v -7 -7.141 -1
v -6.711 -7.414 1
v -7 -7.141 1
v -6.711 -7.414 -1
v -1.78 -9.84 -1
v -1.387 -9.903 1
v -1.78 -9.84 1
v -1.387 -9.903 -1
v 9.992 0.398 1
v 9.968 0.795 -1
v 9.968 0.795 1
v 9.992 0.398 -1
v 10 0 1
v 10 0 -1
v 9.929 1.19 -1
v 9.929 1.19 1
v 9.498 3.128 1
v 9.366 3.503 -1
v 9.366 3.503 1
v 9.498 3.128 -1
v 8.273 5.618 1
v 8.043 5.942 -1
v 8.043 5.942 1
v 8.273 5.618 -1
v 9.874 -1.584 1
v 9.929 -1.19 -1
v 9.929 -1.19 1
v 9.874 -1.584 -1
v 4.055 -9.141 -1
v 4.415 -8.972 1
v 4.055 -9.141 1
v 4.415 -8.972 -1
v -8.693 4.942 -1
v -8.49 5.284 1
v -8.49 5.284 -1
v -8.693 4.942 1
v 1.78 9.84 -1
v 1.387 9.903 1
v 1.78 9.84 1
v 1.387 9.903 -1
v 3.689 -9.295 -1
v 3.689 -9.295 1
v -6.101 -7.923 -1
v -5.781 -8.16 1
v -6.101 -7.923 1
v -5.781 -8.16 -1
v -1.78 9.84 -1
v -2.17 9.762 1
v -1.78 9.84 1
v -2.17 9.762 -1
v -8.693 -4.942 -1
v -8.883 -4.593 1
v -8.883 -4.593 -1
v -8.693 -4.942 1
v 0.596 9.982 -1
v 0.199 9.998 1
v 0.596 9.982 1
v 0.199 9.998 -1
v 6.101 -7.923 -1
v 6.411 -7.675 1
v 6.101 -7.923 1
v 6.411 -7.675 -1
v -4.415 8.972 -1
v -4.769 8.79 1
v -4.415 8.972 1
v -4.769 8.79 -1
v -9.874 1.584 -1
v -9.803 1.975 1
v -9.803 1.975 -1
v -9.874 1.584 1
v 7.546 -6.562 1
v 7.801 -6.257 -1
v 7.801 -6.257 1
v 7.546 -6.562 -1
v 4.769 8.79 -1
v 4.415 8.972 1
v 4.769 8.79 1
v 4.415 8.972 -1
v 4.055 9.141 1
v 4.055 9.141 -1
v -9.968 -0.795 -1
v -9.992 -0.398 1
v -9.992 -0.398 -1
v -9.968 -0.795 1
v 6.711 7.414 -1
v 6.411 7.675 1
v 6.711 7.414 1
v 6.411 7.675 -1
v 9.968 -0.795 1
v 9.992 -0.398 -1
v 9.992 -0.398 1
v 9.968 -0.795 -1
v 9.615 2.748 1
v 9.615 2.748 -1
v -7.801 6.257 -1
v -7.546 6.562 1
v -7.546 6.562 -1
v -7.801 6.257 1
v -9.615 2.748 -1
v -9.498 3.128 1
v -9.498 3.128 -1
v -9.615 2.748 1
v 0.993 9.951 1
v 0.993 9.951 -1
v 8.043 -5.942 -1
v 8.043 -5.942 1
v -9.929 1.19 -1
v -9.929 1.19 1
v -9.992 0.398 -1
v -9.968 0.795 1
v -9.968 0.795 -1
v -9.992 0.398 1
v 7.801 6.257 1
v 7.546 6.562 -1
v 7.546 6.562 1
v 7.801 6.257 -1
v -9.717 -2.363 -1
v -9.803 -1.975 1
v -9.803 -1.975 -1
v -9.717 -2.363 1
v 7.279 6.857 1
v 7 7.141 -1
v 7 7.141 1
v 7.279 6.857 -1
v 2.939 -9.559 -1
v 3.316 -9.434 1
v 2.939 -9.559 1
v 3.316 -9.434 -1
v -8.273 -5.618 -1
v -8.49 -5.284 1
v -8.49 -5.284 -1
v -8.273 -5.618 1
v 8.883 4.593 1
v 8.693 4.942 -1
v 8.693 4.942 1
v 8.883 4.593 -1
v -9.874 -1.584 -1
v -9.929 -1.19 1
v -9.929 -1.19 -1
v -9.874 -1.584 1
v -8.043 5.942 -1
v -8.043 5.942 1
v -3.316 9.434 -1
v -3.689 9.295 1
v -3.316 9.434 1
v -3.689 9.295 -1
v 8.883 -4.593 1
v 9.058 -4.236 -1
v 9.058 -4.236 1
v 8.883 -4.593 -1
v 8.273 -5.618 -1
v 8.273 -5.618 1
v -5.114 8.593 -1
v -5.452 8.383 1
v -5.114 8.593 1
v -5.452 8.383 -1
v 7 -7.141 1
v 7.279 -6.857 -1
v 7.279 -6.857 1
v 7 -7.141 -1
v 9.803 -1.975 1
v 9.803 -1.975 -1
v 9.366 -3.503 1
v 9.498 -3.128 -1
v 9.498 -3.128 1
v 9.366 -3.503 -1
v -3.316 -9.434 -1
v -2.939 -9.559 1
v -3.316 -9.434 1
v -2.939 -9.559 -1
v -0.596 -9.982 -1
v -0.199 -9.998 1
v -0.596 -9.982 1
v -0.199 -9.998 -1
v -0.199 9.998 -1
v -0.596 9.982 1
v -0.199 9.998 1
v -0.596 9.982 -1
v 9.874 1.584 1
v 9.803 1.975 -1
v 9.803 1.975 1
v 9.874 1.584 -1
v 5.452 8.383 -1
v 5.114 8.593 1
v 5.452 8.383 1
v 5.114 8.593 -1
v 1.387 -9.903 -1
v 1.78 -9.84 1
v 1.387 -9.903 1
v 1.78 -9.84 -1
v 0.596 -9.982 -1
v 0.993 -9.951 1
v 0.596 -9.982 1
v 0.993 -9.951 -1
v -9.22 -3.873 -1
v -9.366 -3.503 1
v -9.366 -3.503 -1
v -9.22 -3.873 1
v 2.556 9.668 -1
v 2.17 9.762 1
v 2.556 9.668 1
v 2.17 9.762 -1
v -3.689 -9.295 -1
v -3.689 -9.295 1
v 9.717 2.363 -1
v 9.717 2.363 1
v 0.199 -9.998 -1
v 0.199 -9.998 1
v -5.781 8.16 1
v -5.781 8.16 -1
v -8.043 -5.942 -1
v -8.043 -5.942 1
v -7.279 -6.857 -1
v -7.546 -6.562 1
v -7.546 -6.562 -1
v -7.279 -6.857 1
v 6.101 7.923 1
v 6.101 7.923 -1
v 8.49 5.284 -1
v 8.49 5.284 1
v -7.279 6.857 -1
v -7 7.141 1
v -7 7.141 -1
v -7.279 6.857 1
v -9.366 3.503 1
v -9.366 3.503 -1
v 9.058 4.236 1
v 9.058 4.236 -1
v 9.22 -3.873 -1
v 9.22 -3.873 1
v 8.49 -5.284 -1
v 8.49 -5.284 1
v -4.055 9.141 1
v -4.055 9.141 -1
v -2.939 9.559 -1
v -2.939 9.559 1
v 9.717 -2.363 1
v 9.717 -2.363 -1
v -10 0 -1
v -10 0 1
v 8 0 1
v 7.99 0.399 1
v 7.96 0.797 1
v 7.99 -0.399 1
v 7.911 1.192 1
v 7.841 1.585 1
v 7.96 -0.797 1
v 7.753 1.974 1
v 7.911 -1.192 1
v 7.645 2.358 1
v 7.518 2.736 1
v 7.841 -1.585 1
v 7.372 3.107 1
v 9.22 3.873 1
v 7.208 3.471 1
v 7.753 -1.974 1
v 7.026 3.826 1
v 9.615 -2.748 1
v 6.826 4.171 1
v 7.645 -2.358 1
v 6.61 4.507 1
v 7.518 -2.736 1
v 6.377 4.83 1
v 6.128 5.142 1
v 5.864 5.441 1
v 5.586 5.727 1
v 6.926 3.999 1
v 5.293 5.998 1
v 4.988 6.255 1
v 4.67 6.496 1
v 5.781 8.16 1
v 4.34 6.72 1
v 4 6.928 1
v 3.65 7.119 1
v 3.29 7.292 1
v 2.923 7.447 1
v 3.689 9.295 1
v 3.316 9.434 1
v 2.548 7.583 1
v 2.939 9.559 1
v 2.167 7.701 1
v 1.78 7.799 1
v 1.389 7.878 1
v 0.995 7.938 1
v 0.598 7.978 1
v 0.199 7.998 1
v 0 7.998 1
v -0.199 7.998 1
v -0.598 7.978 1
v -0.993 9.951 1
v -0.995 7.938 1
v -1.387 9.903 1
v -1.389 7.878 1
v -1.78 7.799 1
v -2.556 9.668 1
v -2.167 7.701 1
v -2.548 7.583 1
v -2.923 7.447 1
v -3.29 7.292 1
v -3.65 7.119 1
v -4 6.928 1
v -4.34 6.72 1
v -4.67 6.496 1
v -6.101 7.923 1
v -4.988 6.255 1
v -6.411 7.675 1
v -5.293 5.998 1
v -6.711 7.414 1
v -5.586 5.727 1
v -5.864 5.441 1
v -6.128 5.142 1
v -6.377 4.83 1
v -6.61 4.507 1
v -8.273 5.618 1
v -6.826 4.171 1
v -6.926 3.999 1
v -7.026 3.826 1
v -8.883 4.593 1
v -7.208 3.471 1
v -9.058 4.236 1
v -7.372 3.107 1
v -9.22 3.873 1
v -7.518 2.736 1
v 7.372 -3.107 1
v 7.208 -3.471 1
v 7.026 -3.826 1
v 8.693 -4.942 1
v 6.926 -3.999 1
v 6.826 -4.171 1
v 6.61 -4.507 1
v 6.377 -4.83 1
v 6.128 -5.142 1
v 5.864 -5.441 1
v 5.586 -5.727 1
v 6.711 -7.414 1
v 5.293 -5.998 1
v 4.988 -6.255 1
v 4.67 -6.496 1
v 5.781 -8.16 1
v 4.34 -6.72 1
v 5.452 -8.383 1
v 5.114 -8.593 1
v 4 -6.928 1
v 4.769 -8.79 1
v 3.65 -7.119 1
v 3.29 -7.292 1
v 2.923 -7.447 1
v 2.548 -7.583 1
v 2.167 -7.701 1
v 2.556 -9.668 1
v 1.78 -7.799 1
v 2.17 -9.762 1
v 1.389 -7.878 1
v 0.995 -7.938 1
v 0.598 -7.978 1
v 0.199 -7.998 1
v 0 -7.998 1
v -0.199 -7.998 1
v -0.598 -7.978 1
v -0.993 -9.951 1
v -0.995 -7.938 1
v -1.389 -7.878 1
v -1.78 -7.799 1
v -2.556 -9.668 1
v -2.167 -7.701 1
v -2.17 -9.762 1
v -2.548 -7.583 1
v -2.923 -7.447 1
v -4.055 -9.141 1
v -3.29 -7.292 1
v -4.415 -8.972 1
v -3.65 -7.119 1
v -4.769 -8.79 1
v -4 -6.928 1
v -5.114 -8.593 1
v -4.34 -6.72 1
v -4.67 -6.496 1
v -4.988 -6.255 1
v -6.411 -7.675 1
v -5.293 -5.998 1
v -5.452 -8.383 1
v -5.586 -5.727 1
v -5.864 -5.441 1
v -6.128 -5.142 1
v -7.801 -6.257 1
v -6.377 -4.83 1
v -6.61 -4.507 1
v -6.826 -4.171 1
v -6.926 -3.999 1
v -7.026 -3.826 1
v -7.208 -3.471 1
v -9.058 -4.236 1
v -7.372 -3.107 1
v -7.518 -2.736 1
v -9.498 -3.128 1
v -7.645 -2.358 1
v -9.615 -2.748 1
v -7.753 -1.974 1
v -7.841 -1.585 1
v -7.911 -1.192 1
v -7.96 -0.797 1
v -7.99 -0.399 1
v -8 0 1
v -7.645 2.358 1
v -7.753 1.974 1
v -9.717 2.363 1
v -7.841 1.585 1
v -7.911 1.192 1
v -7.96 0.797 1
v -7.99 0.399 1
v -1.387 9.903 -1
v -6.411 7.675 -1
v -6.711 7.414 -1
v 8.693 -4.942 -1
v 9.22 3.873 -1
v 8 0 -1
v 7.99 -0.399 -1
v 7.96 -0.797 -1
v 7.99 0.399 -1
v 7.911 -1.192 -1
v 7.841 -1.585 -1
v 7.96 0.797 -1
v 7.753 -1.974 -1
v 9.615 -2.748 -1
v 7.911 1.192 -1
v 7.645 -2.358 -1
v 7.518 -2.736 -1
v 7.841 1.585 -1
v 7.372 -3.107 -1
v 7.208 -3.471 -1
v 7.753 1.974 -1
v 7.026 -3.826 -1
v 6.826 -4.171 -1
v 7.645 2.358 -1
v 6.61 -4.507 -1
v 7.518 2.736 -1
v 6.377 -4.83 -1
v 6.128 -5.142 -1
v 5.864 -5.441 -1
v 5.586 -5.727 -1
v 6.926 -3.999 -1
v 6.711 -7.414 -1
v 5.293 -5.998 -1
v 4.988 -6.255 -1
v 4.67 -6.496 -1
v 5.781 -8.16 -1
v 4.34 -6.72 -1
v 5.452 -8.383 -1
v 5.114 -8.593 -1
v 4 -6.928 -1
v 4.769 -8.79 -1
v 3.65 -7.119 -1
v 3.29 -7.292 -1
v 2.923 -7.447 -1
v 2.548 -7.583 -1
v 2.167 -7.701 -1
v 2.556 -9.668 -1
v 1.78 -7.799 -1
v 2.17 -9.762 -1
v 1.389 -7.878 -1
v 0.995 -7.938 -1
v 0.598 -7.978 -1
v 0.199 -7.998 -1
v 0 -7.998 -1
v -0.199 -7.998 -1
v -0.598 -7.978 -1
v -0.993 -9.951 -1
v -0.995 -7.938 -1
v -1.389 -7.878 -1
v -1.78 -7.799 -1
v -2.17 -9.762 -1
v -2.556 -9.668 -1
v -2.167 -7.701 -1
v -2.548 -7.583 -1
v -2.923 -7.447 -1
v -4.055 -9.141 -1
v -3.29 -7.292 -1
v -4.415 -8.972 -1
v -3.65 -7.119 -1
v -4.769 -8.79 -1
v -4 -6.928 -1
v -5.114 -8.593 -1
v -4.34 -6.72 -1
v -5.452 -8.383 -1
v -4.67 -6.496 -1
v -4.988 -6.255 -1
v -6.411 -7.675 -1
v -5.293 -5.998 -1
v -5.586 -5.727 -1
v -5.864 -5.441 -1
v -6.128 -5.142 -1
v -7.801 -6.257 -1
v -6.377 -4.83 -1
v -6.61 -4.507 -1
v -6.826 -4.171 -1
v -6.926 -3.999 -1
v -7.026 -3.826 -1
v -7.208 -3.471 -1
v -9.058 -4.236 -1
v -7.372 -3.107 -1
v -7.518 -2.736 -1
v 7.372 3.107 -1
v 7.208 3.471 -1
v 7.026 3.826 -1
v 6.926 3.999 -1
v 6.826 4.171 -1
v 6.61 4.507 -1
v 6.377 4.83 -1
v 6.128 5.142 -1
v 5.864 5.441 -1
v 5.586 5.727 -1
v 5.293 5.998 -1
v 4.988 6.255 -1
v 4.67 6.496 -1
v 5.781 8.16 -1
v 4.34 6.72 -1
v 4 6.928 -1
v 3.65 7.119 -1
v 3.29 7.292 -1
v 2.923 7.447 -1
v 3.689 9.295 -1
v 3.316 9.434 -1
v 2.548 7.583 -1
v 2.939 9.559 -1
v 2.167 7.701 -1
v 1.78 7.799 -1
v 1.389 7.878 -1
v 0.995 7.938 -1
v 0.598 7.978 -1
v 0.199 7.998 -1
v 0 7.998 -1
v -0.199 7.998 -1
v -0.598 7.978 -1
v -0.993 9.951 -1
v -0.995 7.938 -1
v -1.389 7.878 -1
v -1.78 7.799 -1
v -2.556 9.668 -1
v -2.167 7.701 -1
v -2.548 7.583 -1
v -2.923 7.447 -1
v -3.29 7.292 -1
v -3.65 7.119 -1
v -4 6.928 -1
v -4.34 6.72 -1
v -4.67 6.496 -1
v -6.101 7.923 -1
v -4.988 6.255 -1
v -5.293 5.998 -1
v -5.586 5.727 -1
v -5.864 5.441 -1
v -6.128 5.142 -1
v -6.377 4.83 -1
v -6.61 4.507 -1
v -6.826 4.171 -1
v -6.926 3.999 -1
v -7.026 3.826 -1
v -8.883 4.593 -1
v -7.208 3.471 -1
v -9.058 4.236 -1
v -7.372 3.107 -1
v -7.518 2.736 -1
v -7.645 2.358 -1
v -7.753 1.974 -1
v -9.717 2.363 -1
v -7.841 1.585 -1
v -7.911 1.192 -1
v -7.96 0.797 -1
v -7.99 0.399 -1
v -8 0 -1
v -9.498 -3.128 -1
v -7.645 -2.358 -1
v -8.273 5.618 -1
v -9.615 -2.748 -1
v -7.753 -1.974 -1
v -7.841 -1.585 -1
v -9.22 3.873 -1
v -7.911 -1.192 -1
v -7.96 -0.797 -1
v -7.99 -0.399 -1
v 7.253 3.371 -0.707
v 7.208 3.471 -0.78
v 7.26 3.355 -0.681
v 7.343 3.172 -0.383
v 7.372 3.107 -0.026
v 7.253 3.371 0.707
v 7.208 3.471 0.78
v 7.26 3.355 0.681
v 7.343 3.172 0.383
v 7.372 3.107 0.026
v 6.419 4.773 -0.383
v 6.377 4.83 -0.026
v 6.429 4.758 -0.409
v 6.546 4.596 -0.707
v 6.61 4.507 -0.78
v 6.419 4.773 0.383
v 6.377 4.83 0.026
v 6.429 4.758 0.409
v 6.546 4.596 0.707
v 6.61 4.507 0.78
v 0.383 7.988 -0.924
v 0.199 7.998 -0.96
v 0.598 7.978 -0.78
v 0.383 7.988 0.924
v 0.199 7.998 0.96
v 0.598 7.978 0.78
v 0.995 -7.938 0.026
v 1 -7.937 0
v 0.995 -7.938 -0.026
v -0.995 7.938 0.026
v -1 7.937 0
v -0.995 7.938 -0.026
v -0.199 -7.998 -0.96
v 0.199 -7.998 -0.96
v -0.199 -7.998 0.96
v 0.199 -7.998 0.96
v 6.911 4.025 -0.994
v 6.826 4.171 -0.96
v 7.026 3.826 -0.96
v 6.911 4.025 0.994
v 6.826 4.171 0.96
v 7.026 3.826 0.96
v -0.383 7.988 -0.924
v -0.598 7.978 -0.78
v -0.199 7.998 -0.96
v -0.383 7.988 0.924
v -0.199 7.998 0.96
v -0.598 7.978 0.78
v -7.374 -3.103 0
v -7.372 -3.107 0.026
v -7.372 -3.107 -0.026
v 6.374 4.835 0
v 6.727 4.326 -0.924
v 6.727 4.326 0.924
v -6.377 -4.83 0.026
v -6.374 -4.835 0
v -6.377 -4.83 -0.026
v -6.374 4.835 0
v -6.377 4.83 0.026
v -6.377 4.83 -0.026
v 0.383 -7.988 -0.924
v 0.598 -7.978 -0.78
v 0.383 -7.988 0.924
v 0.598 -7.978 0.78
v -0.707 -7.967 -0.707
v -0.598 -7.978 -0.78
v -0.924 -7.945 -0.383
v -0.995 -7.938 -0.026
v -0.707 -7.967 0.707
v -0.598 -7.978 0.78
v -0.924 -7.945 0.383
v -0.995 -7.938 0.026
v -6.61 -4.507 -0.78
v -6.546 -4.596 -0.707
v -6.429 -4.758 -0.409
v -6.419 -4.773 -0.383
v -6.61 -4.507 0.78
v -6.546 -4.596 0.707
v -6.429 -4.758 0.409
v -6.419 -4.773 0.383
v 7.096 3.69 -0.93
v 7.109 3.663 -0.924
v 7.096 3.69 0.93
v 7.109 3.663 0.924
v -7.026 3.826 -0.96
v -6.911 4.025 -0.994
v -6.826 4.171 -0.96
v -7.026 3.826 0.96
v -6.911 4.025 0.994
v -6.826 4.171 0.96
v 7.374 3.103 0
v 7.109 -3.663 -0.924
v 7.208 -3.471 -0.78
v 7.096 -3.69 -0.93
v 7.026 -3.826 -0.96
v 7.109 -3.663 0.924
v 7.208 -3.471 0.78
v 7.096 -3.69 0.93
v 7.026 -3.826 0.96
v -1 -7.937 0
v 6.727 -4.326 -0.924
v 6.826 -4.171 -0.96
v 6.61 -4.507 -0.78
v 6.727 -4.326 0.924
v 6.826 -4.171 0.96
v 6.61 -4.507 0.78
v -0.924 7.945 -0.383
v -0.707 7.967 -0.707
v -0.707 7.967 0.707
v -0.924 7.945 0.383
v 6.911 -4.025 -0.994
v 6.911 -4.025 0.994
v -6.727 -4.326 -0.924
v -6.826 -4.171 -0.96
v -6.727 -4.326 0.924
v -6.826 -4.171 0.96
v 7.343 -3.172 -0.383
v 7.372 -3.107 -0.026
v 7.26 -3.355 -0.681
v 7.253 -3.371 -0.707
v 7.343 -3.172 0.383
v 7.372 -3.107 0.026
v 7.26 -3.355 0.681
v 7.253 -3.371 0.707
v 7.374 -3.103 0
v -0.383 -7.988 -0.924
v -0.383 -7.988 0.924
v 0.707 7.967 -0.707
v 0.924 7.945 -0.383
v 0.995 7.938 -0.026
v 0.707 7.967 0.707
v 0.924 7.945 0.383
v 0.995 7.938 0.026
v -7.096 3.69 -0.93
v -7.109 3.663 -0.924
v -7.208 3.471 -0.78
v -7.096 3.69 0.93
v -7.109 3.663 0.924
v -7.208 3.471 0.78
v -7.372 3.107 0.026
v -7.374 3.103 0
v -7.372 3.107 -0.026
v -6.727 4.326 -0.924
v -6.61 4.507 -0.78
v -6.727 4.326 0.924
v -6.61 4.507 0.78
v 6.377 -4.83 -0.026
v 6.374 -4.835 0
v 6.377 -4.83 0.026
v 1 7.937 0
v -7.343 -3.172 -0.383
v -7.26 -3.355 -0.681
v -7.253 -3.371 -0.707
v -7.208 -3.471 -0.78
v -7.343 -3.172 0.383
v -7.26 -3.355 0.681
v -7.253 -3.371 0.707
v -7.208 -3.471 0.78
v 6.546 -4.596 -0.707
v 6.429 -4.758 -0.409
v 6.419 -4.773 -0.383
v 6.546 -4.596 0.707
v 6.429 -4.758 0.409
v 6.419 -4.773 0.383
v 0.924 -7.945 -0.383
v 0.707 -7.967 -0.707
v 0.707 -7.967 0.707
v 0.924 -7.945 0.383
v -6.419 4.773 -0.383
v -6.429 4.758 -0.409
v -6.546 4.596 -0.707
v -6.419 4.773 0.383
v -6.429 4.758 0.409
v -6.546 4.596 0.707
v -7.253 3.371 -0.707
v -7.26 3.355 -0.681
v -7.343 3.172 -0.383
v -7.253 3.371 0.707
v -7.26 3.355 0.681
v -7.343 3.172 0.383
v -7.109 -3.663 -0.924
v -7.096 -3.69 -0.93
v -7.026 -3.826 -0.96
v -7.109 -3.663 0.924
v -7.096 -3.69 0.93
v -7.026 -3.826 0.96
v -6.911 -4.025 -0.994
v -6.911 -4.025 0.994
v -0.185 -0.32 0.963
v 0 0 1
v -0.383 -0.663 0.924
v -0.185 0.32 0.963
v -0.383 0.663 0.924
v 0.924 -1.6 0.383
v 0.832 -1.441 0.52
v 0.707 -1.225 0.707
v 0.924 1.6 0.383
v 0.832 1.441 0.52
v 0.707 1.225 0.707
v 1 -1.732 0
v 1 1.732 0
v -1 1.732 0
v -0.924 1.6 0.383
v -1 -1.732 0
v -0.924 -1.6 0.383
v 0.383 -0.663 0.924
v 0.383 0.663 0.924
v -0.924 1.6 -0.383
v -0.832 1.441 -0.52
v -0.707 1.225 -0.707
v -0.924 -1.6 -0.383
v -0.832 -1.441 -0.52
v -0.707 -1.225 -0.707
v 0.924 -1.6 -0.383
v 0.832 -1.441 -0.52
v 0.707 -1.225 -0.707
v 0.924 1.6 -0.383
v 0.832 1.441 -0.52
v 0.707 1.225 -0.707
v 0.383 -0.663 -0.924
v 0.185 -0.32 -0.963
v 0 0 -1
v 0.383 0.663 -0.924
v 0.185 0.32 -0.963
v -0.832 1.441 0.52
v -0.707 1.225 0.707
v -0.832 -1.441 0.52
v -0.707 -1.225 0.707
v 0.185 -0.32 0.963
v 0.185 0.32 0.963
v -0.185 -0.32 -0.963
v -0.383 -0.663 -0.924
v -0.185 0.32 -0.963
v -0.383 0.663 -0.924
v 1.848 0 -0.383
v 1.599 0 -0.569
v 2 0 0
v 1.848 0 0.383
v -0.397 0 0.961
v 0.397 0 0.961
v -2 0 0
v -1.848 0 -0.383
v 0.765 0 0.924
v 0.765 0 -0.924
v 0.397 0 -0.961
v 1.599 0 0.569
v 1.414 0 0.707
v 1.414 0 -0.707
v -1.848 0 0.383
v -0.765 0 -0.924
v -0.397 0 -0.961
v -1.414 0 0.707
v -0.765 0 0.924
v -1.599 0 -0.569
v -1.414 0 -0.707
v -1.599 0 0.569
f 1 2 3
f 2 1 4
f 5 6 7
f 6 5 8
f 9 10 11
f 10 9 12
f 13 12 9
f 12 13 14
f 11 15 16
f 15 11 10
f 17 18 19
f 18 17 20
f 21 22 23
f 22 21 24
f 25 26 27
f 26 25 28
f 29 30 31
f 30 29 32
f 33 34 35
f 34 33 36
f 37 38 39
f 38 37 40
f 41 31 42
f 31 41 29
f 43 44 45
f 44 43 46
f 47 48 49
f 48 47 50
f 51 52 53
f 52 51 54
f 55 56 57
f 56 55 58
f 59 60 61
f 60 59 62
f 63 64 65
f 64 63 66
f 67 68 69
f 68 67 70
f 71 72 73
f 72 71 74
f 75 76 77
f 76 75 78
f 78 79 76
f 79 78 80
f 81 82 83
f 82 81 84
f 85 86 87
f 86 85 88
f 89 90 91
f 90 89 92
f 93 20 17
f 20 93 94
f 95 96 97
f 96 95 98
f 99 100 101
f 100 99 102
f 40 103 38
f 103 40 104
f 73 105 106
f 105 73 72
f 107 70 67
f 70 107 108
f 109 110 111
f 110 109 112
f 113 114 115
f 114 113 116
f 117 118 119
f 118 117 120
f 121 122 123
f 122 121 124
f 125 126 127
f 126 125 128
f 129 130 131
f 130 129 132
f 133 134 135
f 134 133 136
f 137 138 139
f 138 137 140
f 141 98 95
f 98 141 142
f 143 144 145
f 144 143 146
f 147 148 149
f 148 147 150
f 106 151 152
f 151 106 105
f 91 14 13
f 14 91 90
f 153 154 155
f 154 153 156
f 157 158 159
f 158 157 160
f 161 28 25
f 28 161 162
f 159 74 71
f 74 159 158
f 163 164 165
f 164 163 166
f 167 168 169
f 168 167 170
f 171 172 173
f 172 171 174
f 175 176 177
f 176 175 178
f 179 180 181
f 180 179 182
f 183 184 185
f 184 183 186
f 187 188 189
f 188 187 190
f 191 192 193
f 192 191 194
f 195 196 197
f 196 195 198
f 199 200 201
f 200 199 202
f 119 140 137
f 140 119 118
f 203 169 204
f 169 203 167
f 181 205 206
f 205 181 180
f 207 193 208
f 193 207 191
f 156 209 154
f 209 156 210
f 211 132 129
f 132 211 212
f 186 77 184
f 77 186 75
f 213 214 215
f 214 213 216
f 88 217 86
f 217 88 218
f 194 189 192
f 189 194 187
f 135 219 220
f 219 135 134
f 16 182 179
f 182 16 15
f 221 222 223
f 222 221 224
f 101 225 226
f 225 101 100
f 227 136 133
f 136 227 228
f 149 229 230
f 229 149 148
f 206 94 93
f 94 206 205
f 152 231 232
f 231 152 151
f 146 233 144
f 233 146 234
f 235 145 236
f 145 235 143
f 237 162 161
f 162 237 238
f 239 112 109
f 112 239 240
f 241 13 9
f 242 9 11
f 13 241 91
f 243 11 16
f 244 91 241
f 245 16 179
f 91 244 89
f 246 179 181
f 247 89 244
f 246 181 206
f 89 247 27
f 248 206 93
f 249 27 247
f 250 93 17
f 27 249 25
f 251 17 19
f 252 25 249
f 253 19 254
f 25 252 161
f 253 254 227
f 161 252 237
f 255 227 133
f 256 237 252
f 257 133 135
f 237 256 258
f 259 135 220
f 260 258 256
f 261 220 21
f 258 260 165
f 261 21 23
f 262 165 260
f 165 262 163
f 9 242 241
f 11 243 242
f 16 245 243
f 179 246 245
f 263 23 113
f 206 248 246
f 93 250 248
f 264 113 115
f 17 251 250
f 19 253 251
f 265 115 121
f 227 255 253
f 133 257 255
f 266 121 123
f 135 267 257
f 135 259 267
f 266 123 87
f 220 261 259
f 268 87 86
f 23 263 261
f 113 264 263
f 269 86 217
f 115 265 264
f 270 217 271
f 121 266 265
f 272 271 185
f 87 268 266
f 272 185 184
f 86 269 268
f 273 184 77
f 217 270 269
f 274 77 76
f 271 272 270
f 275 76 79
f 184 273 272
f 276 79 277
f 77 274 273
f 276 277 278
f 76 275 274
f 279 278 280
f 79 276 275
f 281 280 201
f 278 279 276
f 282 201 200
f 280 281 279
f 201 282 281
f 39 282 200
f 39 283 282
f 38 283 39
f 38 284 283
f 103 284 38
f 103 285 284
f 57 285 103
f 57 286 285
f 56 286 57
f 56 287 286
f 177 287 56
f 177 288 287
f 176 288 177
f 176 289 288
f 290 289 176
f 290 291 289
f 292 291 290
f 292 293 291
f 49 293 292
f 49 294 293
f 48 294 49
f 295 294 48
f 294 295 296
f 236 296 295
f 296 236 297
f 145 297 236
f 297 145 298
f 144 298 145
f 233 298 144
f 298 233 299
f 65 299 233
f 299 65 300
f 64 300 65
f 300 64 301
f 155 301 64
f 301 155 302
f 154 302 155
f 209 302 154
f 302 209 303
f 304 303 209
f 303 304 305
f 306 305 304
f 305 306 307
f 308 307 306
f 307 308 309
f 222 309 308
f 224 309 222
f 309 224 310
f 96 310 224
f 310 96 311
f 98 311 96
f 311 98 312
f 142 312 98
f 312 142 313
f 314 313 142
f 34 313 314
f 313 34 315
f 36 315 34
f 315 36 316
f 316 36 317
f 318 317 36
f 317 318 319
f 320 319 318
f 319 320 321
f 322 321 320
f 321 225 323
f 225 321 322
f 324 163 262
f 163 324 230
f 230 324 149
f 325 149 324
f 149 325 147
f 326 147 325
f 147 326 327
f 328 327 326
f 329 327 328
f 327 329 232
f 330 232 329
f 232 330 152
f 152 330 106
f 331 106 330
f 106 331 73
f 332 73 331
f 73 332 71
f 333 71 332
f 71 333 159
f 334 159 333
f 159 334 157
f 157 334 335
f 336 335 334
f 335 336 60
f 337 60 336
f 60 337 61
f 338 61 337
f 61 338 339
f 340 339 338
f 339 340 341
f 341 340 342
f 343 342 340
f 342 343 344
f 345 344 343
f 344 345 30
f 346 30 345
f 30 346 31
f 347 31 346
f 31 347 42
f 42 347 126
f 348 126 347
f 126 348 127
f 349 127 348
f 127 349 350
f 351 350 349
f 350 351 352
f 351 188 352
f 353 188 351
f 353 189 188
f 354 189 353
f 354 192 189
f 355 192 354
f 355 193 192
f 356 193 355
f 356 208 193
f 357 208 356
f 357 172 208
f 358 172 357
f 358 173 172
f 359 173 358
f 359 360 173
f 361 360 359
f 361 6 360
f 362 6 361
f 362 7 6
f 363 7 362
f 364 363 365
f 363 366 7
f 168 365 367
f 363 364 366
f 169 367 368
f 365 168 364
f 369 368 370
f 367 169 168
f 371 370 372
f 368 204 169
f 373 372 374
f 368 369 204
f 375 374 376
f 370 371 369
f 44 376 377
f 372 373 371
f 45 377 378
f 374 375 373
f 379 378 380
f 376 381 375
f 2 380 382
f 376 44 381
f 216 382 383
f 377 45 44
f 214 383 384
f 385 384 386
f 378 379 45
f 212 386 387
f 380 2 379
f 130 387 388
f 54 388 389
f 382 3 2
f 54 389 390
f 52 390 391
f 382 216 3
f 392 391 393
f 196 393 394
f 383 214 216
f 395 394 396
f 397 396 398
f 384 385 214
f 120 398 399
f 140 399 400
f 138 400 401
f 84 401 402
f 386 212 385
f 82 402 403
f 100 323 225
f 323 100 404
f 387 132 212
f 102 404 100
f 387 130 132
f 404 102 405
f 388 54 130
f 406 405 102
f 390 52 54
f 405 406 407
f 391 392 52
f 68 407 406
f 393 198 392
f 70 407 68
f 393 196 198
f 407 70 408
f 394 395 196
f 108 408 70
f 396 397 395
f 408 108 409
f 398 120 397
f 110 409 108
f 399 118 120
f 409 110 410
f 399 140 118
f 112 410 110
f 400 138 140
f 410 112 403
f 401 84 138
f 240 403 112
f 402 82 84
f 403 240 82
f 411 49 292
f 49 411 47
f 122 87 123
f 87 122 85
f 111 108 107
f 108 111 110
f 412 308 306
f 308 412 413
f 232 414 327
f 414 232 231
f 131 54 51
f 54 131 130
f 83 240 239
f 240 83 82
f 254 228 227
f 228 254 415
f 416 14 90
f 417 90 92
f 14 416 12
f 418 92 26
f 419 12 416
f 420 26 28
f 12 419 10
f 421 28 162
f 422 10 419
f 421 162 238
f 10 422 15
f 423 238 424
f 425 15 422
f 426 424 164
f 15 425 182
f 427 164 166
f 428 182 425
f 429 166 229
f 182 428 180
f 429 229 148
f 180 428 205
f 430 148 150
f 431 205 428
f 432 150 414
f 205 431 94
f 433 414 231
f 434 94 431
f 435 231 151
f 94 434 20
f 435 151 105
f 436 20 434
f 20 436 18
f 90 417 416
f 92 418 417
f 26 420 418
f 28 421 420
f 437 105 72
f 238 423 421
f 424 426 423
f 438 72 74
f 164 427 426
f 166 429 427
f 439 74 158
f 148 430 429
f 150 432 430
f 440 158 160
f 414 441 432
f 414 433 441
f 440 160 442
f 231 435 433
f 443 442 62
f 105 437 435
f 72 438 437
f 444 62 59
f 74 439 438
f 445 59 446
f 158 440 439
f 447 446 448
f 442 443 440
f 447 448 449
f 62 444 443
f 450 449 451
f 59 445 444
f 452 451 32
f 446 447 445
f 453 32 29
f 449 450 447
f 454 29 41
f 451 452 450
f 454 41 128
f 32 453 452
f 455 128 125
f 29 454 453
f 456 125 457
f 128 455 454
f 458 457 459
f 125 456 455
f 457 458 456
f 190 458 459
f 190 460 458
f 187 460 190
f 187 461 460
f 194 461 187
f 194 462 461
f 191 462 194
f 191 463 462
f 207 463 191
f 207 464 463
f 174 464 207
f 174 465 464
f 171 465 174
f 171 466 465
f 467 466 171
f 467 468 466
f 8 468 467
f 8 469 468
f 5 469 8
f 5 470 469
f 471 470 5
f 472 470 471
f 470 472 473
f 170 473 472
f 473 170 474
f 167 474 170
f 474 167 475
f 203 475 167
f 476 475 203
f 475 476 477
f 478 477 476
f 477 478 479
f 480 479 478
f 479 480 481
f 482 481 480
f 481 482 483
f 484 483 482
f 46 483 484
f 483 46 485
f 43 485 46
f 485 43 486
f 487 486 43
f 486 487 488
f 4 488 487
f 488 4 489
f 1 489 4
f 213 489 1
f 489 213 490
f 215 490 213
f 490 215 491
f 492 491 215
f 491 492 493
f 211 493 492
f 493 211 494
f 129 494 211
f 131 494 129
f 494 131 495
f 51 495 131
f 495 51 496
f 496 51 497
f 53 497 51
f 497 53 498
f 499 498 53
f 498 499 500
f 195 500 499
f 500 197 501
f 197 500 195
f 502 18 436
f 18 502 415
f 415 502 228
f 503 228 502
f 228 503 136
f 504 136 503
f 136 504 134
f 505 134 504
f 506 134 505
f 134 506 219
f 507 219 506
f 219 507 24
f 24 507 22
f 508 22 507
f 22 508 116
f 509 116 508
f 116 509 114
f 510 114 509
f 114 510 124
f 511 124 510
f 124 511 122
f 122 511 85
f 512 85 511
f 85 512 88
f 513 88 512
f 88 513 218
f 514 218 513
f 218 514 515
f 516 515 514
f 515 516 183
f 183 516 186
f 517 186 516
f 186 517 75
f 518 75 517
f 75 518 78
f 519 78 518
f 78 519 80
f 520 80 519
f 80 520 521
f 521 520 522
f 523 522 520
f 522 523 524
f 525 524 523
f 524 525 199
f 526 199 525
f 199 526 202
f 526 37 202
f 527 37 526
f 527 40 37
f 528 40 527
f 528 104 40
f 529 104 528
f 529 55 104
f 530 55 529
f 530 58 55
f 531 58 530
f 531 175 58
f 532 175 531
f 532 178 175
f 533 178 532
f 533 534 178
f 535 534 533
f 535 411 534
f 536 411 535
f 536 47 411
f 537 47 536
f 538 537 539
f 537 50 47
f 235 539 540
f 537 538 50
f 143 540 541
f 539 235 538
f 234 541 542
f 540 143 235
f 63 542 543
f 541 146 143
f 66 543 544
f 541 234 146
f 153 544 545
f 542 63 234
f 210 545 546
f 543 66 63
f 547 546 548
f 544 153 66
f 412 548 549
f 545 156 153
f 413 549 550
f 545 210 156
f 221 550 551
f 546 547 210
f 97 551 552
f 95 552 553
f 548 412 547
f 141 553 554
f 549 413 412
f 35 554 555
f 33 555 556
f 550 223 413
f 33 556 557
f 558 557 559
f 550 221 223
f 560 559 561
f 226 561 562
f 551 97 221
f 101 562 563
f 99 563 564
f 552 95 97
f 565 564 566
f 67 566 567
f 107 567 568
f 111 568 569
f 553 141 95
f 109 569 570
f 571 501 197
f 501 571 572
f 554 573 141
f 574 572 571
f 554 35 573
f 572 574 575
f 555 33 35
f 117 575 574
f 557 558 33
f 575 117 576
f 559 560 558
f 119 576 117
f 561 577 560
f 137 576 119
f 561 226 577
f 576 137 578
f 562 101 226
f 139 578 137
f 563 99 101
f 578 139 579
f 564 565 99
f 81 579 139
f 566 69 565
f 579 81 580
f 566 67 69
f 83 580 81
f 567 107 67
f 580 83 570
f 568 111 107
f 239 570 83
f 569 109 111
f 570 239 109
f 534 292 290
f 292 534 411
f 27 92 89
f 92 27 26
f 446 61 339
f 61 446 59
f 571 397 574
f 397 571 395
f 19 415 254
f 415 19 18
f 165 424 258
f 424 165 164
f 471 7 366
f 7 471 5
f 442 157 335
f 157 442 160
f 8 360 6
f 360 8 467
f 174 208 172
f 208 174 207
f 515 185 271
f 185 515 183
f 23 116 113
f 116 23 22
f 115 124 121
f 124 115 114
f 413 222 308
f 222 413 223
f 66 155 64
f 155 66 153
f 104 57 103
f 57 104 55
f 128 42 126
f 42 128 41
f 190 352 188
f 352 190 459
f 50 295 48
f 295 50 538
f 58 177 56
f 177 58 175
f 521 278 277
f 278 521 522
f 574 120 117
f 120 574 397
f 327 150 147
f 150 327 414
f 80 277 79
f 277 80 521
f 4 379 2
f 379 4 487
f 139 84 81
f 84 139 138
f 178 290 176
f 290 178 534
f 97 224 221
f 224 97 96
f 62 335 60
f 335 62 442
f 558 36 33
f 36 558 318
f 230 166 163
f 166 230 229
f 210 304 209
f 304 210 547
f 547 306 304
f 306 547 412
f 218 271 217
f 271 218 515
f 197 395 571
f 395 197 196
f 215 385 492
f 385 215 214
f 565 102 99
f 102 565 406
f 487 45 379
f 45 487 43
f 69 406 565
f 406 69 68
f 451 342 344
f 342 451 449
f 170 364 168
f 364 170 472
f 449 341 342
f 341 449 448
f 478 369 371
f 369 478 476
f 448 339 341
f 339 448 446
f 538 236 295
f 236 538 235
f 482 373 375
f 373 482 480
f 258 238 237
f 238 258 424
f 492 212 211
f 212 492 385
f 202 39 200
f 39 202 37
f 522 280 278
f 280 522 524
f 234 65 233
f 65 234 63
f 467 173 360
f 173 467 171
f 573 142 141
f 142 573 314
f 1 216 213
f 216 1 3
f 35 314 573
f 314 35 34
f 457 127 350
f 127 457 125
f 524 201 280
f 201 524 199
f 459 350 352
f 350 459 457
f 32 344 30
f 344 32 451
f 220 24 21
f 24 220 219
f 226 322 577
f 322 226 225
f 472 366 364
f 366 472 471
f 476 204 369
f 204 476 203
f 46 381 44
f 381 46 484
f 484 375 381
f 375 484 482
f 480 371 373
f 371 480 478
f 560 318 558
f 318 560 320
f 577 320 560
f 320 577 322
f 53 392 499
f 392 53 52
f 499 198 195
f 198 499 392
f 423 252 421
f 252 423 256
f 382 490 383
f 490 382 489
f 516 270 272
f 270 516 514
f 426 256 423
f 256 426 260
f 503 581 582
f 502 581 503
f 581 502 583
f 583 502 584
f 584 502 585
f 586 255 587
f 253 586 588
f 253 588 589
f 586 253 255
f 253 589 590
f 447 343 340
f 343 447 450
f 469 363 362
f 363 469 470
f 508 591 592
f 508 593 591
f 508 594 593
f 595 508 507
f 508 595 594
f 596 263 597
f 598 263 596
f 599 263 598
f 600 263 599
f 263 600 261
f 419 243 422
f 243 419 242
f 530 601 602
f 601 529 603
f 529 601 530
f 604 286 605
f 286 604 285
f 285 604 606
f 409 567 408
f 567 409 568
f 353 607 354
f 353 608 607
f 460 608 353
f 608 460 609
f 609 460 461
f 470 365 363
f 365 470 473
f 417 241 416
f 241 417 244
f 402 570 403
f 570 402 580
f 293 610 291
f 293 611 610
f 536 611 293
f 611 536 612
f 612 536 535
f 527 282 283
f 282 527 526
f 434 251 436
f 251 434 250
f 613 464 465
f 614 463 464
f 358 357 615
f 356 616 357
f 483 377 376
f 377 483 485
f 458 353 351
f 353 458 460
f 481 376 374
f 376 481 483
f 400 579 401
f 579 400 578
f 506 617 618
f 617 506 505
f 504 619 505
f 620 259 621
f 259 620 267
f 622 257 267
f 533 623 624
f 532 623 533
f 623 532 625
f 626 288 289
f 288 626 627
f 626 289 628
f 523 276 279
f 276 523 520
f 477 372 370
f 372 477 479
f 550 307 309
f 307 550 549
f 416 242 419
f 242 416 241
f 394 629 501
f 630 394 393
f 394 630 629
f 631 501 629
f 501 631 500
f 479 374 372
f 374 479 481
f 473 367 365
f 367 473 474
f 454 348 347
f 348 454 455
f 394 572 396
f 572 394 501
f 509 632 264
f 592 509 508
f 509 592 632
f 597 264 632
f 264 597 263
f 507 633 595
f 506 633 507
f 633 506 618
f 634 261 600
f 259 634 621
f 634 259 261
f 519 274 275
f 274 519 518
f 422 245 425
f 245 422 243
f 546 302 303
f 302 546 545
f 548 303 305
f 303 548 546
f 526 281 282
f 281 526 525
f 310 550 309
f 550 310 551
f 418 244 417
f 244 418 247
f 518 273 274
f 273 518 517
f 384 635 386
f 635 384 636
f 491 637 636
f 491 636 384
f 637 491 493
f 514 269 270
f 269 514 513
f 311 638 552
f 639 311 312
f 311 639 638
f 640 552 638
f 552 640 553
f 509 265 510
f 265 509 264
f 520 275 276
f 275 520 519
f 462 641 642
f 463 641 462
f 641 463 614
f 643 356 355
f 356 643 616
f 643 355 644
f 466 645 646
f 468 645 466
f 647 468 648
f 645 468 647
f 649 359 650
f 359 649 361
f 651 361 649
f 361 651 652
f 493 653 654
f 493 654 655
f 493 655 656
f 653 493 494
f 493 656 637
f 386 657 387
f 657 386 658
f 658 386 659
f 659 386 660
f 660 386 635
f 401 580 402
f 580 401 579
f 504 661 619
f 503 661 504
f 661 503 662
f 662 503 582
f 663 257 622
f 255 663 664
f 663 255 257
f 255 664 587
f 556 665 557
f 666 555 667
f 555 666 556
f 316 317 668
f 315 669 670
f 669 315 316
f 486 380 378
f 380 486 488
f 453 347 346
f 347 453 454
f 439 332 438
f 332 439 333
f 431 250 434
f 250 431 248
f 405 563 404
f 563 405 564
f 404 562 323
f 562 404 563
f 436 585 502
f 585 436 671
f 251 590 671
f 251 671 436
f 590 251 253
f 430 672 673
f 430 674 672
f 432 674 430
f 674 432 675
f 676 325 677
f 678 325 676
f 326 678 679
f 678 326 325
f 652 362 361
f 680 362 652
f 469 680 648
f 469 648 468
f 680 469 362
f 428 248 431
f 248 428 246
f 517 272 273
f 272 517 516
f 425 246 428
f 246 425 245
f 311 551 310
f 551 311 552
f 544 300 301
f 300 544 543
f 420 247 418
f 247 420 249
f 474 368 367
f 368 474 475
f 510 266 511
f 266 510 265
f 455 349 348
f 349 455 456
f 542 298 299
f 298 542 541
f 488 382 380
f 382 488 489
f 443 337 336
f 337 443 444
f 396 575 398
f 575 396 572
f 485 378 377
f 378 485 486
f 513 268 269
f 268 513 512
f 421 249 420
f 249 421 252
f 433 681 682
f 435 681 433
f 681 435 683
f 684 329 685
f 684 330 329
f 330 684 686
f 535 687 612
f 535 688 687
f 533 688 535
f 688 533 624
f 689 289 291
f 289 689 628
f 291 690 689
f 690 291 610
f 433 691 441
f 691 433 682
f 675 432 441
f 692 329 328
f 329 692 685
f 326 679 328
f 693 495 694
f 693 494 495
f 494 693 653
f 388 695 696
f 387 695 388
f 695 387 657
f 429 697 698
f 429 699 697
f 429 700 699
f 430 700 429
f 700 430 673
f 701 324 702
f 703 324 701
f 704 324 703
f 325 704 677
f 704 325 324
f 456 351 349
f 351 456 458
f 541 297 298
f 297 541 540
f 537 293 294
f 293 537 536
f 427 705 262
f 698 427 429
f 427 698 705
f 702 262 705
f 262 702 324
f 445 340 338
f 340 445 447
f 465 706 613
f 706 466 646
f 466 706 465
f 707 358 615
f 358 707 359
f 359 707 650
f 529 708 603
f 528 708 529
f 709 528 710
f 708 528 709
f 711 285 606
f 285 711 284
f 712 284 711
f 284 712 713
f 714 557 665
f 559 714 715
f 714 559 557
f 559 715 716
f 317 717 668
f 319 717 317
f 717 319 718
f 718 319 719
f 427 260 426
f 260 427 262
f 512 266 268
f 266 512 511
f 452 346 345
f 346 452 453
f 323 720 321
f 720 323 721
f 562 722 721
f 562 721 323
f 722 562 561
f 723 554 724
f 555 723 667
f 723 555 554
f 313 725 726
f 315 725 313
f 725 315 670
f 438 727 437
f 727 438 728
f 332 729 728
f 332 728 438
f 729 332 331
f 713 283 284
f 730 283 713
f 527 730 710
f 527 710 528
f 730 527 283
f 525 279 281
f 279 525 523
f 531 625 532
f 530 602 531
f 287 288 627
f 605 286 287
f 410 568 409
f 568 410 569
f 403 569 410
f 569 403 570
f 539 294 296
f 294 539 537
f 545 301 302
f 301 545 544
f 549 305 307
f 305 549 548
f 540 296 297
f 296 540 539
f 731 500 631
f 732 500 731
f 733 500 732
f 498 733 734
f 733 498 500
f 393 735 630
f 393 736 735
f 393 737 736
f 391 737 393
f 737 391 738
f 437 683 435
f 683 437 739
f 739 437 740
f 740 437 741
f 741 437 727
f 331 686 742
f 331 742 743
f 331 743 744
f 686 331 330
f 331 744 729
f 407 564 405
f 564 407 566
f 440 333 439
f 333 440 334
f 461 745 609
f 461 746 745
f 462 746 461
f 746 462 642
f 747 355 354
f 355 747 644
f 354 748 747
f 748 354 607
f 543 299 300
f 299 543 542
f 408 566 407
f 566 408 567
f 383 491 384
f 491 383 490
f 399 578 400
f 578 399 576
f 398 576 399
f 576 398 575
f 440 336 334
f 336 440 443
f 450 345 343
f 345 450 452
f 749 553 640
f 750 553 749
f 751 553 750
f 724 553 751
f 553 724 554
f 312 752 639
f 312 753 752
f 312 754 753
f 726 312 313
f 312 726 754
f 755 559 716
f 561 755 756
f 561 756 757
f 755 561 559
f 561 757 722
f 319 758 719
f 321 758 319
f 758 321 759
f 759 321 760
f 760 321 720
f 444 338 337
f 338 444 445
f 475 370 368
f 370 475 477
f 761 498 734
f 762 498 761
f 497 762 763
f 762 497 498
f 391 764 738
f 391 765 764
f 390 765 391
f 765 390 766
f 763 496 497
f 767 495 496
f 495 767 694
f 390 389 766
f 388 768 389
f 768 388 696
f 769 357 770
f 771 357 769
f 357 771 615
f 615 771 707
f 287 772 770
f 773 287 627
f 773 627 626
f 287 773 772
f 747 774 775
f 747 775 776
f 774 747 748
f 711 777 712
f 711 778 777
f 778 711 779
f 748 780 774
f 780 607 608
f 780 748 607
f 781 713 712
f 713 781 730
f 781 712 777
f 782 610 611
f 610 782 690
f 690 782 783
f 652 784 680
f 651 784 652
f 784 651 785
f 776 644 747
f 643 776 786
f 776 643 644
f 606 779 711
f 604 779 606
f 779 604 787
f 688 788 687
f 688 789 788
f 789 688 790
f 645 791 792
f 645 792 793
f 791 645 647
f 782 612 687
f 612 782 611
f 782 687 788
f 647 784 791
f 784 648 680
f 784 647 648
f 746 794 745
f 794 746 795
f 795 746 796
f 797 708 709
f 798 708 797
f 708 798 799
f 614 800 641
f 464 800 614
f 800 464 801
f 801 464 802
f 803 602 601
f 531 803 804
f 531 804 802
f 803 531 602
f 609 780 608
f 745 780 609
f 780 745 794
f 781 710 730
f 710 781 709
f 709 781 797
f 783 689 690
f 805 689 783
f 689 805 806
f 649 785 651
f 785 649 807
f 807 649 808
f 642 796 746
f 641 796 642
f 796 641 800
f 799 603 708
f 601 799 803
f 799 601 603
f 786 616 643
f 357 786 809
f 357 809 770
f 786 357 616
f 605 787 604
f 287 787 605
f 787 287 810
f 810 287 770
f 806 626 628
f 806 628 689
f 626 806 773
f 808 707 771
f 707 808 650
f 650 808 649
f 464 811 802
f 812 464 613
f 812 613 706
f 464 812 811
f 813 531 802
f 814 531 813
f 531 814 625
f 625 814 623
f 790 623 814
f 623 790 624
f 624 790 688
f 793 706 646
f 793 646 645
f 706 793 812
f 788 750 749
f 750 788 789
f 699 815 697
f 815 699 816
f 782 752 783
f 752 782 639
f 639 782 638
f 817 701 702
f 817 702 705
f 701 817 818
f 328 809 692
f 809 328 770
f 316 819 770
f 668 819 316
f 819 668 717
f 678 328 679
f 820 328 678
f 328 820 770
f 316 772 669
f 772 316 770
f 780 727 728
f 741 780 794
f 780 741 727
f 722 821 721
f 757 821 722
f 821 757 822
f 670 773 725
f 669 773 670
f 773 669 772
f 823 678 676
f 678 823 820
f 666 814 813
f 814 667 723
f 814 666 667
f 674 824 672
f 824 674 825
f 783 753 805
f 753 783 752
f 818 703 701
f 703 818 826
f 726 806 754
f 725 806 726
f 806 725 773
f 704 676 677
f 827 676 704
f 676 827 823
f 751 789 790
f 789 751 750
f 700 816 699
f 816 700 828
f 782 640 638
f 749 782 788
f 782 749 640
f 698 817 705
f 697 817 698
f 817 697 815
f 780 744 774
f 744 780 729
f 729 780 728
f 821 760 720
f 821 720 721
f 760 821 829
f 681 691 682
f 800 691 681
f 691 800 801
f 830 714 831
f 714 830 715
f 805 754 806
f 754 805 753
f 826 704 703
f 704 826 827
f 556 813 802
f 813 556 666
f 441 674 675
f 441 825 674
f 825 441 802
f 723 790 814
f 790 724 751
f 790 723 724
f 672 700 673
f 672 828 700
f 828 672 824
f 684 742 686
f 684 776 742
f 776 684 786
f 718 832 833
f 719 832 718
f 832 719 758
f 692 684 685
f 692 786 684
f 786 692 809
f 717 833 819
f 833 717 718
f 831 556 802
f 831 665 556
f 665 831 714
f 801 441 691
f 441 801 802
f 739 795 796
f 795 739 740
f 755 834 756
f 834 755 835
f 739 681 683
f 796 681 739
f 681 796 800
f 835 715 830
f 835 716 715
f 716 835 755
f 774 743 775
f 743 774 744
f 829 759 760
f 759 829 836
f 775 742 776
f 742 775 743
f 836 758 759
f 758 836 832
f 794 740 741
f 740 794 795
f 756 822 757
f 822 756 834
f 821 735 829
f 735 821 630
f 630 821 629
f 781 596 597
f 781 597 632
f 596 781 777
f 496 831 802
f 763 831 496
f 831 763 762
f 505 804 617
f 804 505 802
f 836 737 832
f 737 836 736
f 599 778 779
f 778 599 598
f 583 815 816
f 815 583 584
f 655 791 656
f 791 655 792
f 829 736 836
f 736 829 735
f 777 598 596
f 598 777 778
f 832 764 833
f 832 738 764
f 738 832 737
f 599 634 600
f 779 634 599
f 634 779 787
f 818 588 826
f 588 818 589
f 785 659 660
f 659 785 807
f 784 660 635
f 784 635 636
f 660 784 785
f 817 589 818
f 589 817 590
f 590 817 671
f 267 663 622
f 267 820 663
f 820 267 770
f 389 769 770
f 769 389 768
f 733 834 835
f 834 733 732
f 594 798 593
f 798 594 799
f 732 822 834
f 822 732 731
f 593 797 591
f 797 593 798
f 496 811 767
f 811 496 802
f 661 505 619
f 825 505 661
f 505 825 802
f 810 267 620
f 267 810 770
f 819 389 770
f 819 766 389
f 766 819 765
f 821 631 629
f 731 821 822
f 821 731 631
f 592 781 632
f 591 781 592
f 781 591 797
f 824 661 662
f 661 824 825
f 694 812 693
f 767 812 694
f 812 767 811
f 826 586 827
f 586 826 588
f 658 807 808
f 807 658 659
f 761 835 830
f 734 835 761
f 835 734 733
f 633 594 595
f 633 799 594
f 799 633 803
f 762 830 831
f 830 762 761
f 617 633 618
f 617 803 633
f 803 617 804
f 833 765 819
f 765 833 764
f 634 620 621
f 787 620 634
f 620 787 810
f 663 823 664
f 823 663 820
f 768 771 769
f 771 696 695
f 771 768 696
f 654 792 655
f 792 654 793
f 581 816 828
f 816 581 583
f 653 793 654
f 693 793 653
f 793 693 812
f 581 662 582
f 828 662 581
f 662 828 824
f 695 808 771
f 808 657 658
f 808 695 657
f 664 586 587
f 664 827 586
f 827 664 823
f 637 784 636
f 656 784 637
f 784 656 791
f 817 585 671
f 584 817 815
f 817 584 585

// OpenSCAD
$fa = 1;
$fs = 0.4;

wheel_thickness = 2;
wheel_diameter = 20;
tyre_thickness = 2;

number_of_radius = 3;

difference() {
	cylinder(h = wheel_thickness, r = wheel_diameter / 2, center = true);
	cylinder(h = 3, r = wheel_diameter / 2 - tyre_thickness, center = true);
}

step = 180/number_of_radius;
for (i=[0:step:179]) {
    angle = i;
    rotate([90,0,angle])
       cylinder(r=wheel_thickness / 2, h=wheel_diameter * 0.95, center=true);
}
